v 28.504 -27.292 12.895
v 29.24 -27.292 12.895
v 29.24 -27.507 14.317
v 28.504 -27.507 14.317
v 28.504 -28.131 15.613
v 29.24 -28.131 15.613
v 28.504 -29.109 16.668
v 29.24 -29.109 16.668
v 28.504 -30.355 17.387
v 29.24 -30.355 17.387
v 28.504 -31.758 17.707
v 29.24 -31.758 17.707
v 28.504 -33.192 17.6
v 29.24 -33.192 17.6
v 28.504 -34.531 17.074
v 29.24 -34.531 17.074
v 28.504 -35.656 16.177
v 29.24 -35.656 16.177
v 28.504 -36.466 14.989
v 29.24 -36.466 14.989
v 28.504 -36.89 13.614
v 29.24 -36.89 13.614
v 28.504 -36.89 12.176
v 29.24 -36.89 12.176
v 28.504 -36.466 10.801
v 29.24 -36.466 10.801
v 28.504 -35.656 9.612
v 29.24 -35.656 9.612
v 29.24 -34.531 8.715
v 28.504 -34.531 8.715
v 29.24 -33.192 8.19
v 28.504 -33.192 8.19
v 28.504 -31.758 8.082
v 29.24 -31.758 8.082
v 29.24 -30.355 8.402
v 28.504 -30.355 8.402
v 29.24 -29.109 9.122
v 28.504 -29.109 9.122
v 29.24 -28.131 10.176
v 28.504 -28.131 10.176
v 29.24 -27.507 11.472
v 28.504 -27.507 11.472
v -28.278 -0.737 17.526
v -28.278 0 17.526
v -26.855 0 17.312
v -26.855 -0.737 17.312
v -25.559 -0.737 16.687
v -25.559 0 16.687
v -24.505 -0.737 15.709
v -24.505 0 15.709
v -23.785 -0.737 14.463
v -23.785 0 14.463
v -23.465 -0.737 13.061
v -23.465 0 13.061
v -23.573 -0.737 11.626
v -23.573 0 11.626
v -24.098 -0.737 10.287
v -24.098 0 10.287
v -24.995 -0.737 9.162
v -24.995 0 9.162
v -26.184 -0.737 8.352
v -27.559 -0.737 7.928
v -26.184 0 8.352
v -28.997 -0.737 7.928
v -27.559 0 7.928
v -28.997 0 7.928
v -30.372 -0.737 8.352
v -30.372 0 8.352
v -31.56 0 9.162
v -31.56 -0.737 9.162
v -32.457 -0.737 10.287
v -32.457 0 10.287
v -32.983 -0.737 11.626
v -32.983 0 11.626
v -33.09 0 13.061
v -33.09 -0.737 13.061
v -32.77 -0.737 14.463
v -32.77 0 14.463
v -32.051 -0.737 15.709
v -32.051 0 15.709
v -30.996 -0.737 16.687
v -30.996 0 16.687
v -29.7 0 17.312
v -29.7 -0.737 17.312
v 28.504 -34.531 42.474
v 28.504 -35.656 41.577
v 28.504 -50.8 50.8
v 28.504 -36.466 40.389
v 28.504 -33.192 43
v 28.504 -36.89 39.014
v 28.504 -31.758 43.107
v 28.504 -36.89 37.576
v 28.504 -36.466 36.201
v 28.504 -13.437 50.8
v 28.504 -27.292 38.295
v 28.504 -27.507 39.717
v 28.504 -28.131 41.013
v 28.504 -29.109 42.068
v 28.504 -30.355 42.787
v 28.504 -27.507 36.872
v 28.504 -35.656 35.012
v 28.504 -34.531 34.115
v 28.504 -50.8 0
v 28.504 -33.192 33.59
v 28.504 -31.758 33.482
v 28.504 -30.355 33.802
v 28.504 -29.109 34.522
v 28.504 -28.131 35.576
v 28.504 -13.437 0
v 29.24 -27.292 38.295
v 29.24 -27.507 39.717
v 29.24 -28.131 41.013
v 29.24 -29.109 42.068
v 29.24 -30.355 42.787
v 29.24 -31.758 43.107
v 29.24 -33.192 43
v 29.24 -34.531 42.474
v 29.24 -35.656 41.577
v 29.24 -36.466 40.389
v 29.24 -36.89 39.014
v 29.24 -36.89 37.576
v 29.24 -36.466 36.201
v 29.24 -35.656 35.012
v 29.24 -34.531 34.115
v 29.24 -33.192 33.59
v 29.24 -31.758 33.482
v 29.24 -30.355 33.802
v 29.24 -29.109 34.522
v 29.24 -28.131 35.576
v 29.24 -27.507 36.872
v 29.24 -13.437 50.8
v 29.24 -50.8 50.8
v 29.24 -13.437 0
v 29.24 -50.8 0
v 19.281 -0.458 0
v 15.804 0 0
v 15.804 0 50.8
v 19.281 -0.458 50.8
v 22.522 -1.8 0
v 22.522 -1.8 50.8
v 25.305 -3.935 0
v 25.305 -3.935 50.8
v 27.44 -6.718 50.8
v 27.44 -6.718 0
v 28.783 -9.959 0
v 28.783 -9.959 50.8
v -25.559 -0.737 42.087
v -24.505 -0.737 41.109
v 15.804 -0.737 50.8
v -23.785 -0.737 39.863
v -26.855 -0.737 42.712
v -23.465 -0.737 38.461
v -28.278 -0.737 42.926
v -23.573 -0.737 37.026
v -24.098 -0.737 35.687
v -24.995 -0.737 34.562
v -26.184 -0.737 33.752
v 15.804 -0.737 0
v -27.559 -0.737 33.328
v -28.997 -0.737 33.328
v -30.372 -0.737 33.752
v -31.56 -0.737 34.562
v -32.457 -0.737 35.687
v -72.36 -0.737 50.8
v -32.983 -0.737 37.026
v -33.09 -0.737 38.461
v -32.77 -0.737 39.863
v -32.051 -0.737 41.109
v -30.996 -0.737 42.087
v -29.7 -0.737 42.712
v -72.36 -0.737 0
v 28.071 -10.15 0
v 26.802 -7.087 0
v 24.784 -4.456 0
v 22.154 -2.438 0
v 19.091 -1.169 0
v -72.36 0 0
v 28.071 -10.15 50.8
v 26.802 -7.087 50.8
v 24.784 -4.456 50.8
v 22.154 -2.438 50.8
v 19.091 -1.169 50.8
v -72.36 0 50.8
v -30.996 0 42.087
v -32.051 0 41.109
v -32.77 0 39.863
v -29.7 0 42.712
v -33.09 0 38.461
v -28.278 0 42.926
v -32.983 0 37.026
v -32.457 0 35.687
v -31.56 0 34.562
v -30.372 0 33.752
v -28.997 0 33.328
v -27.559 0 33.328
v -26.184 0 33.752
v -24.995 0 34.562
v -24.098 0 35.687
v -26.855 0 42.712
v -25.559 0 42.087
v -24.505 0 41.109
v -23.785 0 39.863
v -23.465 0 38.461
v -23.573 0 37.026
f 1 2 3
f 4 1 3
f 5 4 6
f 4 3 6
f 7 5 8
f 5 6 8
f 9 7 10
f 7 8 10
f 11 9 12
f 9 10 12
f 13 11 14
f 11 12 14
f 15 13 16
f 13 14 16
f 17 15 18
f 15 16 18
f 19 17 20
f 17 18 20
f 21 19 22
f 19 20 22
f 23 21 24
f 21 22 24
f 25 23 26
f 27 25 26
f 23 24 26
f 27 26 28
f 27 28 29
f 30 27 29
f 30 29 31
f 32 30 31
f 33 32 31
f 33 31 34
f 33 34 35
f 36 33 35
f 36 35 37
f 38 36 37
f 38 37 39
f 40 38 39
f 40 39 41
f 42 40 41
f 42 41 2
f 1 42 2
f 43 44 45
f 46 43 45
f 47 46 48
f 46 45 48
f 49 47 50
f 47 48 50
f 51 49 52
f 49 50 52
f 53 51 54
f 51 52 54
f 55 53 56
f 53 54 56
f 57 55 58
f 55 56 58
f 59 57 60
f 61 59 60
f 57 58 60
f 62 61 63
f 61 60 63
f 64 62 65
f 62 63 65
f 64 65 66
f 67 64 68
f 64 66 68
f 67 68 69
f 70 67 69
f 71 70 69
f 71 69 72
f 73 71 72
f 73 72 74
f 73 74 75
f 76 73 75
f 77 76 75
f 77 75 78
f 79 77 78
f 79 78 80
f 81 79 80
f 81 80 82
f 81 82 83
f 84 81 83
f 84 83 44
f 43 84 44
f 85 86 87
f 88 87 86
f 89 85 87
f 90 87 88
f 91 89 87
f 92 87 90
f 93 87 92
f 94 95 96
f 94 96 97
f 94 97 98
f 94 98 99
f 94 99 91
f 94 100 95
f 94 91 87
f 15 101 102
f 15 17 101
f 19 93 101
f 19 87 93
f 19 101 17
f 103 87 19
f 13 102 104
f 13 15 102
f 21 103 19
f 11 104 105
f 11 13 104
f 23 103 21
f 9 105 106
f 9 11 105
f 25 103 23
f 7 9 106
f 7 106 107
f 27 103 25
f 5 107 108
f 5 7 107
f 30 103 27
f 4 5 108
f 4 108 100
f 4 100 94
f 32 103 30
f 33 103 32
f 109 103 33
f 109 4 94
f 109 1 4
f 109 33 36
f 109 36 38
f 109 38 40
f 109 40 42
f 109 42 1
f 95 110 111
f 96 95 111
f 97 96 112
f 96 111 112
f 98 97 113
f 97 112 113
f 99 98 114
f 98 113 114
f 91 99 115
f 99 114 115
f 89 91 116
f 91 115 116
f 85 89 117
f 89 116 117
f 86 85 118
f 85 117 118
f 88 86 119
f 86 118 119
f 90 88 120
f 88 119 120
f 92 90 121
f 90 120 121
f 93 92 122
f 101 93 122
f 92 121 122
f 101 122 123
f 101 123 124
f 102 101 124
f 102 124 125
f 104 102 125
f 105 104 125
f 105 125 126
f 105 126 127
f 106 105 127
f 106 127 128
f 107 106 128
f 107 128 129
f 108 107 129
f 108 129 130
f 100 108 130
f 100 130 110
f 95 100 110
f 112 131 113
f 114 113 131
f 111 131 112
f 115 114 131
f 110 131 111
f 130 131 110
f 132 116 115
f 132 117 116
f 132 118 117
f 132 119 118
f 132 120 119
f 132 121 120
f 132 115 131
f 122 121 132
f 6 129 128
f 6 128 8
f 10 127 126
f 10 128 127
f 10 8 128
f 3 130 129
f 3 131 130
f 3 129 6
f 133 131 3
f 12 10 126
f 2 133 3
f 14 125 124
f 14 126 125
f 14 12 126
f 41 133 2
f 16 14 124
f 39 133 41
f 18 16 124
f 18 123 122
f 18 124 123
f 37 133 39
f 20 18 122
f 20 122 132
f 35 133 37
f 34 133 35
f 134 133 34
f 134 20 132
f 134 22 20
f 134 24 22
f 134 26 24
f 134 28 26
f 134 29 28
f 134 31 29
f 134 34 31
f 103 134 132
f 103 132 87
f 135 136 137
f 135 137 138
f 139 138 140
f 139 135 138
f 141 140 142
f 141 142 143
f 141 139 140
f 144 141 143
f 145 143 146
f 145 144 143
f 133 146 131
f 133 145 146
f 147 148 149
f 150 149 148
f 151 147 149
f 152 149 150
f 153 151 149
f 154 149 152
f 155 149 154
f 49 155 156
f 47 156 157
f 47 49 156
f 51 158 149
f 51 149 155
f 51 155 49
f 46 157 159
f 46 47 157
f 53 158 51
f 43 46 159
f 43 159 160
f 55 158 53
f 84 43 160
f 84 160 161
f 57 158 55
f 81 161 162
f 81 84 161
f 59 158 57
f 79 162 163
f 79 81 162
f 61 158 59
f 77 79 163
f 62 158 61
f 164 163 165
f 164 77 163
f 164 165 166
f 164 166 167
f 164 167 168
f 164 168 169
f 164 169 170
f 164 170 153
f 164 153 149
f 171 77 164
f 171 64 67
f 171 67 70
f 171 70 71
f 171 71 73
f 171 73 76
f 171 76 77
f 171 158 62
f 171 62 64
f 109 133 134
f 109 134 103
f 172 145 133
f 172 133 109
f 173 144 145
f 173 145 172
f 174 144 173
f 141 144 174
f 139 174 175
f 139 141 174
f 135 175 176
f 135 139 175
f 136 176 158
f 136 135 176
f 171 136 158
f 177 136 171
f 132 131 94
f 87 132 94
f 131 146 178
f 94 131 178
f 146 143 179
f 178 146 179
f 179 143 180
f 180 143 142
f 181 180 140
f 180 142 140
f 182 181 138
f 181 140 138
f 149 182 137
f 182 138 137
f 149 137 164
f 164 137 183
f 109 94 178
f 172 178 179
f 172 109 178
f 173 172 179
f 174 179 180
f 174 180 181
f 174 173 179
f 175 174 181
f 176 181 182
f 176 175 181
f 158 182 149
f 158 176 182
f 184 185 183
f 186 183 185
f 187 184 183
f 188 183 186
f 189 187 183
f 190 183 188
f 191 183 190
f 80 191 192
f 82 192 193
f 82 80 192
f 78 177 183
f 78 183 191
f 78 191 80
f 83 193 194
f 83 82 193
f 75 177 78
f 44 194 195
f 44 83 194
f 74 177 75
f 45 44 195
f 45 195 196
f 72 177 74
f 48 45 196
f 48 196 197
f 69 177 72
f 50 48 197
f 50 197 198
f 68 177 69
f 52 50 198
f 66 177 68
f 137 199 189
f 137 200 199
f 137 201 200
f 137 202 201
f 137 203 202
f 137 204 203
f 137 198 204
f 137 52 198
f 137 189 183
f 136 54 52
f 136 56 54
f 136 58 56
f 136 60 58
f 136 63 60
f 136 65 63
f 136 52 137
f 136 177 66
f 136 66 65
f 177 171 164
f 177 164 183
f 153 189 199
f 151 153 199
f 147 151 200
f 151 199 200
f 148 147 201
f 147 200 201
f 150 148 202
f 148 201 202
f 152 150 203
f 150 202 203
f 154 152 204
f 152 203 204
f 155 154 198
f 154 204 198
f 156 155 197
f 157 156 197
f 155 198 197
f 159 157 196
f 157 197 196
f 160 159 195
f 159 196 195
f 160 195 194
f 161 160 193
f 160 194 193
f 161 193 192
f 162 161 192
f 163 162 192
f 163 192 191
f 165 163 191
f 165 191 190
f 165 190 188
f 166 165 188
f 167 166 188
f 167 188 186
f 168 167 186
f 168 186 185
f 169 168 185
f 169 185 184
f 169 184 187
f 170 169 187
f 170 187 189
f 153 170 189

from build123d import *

# Parameters (mm, degrees)
BASE_FLANGE1_DEPTH = 50.8
SKETCH7_R          = 4.826
CUT_EXTRUDE1_DEPTH = 2.54
SKETCH8_R          = 4.826
CUT_EXTRUDE2_DEPTH = 2.54


# Sheet-metal steps are written as plain solids
with BuildPart() as part:
    # Sketch2 → Base-Flange1 (new body)
    with BuildSketch(Plane.XY):
        with BuildLine():
            Line((-72.359580073, 0), (15.803819927, 0))
            ThreePointArc((15.803819927, 0), (25.304930904, -3.935489024), (29.240419927, -13.4366))
            Line((29.240419927, -13.4366), (29.240419927, -50.8))
            Line((29.240419927, -50.8), (28.503819927, -50.8))
            Line((28.503819927, -50.8), (28.503819927, -13.4366))
            ThreePointArc((28.503819927, -13.4366), (24.784076049, -4.456343879), (15.803819927, -0.7366))
            Line((15.803819927, -0.7366), (-72.359580073, -0.7366))
            Line((-72.359580073, -0.7366), (-72.359580073, 0))
        make_face()
    extrude(amount=BASE_FLANGE1_DEPTH)

    # Sketch7 → Cut-Extrude1 (cut)
    with BuildSketch(Plane(origin=(29.240419927, 0, 0), x_dir=(0, 0, -1), z_dir=(1, 0, 0))):
        with Locations(Location((-12.894872644, -32.1183, 0), (0, 0, 90))):
            Circle(SKETCH7_R)
        with Locations(Location((-38.294872644, -32.1183, 0), (0, 0, 90))):
            Circle(SKETCH7_R)
    extrude(amount=-CUT_EXTRUDE1_DEPTH, mode=Mode.SUBTRACT)

    # Sketch8 → Cut-Extrude2 (cut)
    with BuildSketch(Plane(origin=(0, 0, 0), x_dir=(1, 0, 0), z_dir=(0, 1, 0))):
        with Locations(Location((-28.277880073, -38.1, 0), (0, 0, 270))):
            Circle(SKETCH8_R)
        with Locations(Location((-28.277880073, -12.7, 0), (0, 0, 270))):
            Circle(SKETCH8_R)
    extrude(amount=-CUT_EXTRUDE2_DEPTH, mode=Mode.SUBTRACT)


solid = part.part
